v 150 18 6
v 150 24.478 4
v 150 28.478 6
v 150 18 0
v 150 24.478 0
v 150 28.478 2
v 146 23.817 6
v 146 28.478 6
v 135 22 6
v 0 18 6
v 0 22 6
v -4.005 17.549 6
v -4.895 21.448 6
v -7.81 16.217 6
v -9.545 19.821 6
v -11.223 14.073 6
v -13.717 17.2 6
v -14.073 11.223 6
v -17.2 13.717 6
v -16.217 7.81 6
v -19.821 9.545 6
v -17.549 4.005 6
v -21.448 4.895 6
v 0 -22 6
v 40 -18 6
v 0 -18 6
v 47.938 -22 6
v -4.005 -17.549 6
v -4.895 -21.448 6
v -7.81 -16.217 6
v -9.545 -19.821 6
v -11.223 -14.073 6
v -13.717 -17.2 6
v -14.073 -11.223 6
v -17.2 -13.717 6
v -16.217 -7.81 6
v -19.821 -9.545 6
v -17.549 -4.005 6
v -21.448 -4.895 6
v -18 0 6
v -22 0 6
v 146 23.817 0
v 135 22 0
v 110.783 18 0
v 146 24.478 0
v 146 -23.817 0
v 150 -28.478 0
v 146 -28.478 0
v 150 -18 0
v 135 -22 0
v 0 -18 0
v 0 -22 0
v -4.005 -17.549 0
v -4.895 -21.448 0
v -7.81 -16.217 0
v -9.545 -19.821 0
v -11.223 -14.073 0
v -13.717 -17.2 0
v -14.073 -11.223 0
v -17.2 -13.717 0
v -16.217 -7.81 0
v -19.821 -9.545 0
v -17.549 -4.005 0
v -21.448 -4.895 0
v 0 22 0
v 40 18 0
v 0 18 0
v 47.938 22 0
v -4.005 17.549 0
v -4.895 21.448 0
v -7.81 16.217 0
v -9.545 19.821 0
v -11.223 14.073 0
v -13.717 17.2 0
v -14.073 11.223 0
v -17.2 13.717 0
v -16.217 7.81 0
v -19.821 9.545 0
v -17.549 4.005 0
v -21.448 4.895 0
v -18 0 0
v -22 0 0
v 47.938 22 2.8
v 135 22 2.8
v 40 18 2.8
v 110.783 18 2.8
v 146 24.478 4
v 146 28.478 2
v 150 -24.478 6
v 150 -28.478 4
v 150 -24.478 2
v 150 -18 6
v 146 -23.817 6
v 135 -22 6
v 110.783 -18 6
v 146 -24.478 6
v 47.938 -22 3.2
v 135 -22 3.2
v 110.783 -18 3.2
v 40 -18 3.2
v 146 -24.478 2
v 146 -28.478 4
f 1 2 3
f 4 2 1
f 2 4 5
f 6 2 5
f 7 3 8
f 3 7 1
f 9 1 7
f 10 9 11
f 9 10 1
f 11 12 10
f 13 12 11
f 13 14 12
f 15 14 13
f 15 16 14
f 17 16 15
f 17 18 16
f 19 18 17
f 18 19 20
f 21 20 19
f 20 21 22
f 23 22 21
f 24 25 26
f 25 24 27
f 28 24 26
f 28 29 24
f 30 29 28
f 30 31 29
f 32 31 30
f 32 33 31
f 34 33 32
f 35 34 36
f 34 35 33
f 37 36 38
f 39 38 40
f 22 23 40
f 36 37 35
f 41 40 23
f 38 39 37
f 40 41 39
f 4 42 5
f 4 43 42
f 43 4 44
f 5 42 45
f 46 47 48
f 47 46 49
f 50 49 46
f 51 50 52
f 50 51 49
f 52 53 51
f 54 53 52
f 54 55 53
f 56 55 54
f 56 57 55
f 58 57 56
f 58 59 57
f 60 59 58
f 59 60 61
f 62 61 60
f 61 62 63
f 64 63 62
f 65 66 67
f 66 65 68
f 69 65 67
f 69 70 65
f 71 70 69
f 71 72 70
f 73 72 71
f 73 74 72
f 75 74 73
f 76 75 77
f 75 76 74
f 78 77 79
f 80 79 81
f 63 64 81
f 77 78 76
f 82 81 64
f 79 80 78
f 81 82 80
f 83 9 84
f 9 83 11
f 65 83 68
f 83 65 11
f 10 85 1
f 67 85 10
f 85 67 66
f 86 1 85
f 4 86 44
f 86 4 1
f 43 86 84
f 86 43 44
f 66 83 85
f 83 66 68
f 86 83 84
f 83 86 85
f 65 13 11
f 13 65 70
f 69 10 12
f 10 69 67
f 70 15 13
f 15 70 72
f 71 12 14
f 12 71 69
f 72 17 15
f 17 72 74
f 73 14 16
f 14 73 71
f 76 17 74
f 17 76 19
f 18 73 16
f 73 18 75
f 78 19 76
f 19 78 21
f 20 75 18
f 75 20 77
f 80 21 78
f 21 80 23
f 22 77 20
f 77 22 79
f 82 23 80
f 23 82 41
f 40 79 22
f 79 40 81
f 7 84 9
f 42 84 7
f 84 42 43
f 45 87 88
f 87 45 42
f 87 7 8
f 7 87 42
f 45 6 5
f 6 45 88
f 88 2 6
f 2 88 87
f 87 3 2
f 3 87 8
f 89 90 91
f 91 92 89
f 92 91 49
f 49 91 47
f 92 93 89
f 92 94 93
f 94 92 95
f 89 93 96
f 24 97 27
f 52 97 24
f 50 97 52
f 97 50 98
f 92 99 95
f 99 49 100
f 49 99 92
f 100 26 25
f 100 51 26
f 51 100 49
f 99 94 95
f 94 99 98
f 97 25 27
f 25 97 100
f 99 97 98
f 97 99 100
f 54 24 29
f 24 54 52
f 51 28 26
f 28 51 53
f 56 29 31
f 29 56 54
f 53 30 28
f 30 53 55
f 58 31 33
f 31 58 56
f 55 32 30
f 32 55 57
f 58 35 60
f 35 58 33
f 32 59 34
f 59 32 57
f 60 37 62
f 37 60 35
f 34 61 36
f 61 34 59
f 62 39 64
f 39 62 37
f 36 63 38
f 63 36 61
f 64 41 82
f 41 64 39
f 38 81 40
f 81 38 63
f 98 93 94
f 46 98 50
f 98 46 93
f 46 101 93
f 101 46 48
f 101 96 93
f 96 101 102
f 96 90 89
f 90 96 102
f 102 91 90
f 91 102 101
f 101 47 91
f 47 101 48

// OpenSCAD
spring_radius = 20;
length = 150;
width = 4;
height = 6;
gap = 0.2;
crossover_point = 40;
tip = 15;

inner_radius = spring_radius-width/2;
outer_radius = spring_radius+width/2;
max_deflection = asin(inner_radius/crossover_point);
arm_length = length - outer_radius;
tip_width = length - tip;
tip_start = length-tip;
min_deflection = asin(outer_radius/tip_start);

echo(min_deflection=min_deflection, max_deflection=max_deflection);

/*
Create a 3D arc with the z axis as its center line, resting on the xy plane, starting at x=0 and
going counterclockwise when viewed from above
*/
module arc3d(ri=1, ro=2, h=1, angle=360) {
    rotate_extrude(angle=angle) translate([ri,0]) square([ro-ri, h]);
}

module tong_half() {
    crossover_center = (crossover_point + tip_start)/2;
    crossover_height = height/2-gap;
    d1 = width / tan(max_deflection);
    d2 = width / tan(min_deflection);

    // spring
    rotate([0,0,90]) arc3d(ri=inner_radius, ro=outer_radius, h=height, angle=90);

    // arms
    difference() {
        translate([0,inner_radius,0]) cube([length,width,height]);
        linear_extrude(crossover_height) {
            polygon([[crossover_point, inner_radius], [crossover_point+d1, outer_radius], [tip_start, outer_radius], [tip_start-d2, inner_radius]]);
        }
    }
    // grasper
    grasper_width = tip * tan(min_deflection);
    linear_extrude(height) {
        polygon([[tip_start, outer_radius], [length, outer_radius], [length, outer_radius+grasper_width]]);
    }
    translate([length-width/2, outer_radius+grasper_width, width-1]) scale([width, width, height/6]) rotate([90,90,90]) linear_extrude(1, center=true) polygon([[-3,-1],[-3,1],[-1,0],[1,1],[3,0],[3,-1],[-3,-1]]);


}

module tong() {
    tong_half();
    translate([0,0,height]) mirror([0,0,1]) mirror([0,1,0]) tong_half();
}

tong();
